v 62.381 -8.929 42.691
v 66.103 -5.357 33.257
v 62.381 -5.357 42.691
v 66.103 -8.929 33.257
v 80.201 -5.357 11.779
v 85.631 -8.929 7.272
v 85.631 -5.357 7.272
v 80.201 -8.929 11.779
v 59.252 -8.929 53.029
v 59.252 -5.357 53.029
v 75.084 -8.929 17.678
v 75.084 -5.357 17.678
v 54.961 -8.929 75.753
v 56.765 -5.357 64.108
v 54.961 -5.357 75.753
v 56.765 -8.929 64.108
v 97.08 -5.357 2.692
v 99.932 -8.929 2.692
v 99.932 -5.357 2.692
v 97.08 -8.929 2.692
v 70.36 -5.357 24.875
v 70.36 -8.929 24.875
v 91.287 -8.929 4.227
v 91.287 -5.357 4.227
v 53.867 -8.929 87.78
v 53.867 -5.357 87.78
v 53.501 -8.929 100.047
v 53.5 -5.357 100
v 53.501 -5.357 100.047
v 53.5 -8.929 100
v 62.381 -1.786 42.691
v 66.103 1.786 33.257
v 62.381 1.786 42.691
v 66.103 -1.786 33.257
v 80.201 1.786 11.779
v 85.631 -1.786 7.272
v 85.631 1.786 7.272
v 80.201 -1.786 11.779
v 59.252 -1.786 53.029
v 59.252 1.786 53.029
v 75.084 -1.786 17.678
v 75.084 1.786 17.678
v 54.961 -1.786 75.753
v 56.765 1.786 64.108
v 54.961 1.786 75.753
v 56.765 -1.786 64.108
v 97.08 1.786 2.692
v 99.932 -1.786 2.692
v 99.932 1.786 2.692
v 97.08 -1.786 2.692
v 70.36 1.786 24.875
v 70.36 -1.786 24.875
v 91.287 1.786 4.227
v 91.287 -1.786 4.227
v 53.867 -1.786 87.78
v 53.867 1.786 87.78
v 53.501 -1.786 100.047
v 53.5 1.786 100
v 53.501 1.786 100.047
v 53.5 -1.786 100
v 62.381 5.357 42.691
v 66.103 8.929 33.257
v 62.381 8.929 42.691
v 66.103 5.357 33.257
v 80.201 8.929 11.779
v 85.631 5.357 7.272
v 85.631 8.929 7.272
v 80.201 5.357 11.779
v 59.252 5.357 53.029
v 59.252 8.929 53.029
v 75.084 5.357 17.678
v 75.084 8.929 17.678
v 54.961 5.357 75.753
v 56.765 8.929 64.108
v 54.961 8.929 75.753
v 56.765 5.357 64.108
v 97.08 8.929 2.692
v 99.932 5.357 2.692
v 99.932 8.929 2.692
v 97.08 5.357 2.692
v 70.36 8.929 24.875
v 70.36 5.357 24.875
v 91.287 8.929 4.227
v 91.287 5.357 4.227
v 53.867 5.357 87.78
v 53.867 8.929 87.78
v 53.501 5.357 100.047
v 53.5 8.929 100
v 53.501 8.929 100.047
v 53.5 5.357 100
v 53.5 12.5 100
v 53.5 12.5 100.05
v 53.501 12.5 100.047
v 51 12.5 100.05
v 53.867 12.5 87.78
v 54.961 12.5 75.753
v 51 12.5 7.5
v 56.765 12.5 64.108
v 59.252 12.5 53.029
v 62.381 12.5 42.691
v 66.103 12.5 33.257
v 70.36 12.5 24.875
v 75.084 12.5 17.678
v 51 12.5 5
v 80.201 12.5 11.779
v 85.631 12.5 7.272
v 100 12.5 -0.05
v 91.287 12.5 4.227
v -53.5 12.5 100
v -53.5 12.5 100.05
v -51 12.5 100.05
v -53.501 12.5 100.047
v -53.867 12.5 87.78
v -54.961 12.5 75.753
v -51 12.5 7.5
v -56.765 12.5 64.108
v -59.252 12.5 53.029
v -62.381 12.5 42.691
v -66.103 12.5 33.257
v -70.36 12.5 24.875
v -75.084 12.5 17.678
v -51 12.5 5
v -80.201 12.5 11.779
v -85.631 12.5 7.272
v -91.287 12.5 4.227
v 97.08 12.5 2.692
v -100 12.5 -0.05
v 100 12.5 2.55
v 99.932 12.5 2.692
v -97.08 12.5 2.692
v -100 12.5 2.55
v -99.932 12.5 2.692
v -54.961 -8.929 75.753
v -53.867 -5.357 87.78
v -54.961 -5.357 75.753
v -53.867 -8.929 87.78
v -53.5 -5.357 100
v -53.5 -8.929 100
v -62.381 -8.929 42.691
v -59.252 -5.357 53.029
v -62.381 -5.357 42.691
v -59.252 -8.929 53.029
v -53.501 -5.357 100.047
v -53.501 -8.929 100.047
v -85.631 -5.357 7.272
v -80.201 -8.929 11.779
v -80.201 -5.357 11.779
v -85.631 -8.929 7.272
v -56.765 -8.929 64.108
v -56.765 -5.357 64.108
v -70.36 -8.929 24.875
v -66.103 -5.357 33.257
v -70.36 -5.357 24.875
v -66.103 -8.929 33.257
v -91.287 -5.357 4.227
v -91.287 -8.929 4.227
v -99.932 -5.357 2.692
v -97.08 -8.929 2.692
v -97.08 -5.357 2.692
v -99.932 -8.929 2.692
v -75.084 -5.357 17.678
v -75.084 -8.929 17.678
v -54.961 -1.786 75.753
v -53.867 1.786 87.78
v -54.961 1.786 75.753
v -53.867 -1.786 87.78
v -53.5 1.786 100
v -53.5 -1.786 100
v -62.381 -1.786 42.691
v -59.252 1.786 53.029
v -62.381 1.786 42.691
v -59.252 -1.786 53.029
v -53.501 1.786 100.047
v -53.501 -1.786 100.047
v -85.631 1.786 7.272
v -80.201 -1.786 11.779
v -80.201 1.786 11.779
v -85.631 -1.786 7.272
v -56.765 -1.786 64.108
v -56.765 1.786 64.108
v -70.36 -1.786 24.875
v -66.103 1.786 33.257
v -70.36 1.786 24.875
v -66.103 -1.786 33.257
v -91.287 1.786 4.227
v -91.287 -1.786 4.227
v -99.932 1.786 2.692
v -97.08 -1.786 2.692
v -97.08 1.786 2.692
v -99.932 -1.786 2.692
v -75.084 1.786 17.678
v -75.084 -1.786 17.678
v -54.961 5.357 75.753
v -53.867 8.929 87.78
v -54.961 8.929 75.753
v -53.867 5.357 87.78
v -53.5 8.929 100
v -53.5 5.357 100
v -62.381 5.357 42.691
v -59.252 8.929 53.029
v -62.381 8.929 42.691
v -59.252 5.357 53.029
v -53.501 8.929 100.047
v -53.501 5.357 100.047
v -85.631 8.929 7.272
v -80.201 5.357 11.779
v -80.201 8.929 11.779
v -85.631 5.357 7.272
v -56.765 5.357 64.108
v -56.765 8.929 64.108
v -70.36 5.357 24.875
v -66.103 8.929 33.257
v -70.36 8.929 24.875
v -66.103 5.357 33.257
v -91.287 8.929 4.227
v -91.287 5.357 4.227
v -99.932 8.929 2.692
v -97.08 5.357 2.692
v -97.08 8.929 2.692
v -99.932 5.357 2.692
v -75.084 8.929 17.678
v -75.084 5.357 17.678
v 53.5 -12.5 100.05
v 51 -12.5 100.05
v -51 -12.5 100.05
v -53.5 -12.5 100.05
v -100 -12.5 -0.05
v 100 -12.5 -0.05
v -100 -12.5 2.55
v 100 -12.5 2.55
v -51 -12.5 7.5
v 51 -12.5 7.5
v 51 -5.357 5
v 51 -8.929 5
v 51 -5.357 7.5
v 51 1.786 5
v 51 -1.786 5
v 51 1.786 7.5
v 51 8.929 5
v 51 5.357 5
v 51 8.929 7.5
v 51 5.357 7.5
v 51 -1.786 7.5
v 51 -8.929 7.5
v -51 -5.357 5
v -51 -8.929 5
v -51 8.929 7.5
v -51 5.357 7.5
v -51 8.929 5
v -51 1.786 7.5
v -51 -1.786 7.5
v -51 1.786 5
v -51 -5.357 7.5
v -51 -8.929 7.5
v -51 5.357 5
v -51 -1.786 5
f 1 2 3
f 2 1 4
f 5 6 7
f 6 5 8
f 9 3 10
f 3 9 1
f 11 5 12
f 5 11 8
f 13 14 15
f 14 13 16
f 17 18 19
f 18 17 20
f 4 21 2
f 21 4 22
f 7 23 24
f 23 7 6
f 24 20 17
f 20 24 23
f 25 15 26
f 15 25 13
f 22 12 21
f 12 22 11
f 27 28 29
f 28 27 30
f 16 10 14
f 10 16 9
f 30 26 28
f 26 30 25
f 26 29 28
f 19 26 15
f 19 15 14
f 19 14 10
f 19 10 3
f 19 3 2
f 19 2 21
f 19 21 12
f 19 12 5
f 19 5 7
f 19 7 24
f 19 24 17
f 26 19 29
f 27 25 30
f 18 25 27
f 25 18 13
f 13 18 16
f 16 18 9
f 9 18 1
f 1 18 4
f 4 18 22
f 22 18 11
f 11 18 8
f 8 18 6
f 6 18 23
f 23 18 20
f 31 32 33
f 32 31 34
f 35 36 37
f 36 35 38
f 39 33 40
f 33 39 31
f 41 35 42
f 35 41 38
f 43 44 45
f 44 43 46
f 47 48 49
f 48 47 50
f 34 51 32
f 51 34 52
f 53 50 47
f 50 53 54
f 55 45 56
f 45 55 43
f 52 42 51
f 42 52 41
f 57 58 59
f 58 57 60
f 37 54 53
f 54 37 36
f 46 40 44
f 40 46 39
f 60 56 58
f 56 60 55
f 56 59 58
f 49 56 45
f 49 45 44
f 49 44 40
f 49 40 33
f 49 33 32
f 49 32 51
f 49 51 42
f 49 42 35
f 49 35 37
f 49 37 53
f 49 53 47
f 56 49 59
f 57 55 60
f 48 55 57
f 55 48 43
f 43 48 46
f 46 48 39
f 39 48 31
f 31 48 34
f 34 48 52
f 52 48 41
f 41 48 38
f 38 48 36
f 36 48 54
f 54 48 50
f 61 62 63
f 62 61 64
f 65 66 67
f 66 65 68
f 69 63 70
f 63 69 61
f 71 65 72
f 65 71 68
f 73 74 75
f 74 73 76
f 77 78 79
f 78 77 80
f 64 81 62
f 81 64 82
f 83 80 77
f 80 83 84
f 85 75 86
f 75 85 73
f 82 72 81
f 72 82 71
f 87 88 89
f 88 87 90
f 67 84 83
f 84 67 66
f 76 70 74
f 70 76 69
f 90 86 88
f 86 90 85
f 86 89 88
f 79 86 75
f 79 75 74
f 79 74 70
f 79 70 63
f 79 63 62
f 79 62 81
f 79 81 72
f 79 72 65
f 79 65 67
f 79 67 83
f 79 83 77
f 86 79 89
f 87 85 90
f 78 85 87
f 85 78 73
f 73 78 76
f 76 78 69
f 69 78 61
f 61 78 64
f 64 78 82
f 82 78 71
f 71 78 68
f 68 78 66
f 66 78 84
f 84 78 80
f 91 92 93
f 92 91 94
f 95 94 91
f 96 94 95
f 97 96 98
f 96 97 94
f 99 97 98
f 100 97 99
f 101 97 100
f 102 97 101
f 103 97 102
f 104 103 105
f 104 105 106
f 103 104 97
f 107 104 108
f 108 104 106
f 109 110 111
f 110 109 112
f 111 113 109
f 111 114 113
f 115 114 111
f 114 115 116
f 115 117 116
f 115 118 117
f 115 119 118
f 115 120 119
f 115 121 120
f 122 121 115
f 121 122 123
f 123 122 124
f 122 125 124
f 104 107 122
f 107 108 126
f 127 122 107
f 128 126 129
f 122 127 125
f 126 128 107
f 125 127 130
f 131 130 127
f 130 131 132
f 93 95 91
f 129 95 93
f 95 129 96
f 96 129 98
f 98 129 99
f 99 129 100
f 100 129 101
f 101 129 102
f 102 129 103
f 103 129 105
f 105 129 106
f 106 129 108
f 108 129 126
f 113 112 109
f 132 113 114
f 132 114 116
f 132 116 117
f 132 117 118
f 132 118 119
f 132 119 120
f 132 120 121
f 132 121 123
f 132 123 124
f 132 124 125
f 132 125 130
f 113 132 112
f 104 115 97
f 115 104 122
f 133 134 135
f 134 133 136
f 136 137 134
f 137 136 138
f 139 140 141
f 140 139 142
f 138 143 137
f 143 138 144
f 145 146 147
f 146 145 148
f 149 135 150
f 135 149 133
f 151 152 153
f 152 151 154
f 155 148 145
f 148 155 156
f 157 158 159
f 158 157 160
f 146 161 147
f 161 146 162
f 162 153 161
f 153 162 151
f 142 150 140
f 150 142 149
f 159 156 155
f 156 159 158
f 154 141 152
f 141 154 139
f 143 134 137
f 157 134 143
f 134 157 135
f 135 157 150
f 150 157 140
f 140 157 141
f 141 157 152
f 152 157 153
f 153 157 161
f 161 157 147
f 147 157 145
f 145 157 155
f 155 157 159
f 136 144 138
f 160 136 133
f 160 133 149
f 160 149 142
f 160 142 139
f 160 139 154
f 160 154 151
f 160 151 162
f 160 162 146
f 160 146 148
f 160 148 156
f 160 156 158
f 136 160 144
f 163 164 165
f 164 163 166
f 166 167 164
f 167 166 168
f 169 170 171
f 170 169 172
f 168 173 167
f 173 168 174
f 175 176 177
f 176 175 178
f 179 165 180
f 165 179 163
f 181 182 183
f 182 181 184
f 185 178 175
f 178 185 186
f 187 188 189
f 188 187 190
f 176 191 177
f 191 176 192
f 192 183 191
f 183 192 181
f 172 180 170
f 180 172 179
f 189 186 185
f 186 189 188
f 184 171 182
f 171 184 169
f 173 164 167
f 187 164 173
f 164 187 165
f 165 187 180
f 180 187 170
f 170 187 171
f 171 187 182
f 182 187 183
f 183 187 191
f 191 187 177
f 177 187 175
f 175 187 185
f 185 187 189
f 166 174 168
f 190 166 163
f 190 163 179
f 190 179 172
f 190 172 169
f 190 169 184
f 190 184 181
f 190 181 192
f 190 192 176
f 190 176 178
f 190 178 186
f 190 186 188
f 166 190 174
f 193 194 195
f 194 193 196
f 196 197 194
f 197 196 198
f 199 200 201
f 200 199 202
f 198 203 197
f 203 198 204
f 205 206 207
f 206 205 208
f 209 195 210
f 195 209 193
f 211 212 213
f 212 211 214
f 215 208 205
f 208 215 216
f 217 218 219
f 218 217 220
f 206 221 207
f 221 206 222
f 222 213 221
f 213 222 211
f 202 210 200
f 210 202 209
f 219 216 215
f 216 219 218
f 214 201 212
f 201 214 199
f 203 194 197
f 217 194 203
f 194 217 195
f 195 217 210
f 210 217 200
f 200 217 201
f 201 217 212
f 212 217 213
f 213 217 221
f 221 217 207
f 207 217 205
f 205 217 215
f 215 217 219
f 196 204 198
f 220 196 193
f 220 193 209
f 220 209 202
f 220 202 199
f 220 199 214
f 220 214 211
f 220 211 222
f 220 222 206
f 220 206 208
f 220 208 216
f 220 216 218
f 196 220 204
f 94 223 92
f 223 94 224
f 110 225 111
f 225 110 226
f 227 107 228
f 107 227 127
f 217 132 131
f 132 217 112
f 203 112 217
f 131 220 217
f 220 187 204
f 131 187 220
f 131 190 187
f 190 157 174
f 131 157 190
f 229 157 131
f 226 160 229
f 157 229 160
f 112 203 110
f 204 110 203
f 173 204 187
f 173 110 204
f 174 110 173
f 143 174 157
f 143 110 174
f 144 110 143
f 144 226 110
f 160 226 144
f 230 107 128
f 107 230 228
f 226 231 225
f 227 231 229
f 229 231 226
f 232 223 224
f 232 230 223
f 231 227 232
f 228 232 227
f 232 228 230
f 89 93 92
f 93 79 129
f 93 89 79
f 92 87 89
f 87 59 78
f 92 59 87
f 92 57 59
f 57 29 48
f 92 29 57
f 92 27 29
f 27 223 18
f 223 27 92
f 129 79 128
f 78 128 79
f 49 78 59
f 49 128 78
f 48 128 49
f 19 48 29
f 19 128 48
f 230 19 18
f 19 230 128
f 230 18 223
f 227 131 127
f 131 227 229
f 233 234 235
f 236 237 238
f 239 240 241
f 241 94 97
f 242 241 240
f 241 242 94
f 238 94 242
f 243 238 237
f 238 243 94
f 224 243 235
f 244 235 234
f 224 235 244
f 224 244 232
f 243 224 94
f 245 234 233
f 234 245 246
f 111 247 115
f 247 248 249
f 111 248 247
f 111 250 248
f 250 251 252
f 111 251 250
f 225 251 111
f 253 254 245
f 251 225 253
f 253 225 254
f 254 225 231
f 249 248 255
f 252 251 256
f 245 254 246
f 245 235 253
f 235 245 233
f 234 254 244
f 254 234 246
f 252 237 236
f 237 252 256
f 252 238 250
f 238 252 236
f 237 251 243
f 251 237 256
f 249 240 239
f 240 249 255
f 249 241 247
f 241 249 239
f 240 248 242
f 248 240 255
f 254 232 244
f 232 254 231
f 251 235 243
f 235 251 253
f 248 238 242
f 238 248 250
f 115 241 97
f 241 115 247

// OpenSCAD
// Depth of the stand, in mm. 
StandDepth = 25;

// Total height of the stand
StandHeight = 100;

// Width of the base of the stand
BaseWidth = 200;

// Width of the slot in the stand. Must be smaller than the width of the base.
SlotWidth = 102;

// Height of the connecting bridge between the two vertical supports. 
BaseHeight = 7.5;

// Size of the edges on the top and side.
MinEdgeWidth = 2.5;

// Number of ridges in the support.
NrRidges = 4;

/* [Hidden] */
 ridgeWidth = StandDepth / (2 * NrRidges - 1);
 
module ridgeDuplicator() {
    for (y = [-StandDepth/2 + ridgeWidth : 2*ridgeWidth : StandDepth/2])
            translate([0,y, 0])
                children(0);
}

module slot() {
    translate([-SlotWidth/2, 0 , BaseHeight]) 
        union() {
             translate([ 0, -StandDepth/2 - .5 , 0]) cube([SlotWidth, StandDepth + 1, StandHeight - BaseHeight + .5]); 
              ridgeDuplicator() 
                 translate([0,0,-MinEdgeWidth])
                    cube([SlotWidth, ridgeWidth, MinEdgeWidth + 1]);
        }
}

module base() {
    supportWidth = (BaseWidth - SlotWidth)/2 - MinEdgeWidth;
    supportHeight = StandHeight - MinEdgeWidth;
    supportXOffset = SlotWidth / 2 +supportWidth + MinEdgeWidth;
    supportZOffset = supportHeight + MinEdgeWidth;
    
    module cutOut() {
        ridgeDuplicator()
             scale([supportWidth, ridgeWidth, supportHeight])rotate(a=90, v=[-1,0,0] ) cylinder( $fn=50);
    }
    
    difference() {
        hull() {
            cube([BaseWidth, StandDepth, .1], center=true);
            translate([0,0, MinEdgeWidth]) cube([BaseWidth, StandDepth, .1], center=true);
            translate([0,0,StandHeight]) cube([SlotWidth + 2*MinEdgeWidth, StandDepth, .1], center=true);
        }
        translate([supportXOffset, 0, supportZOffset]) cutOut();
        translate([-supportXOffset, 0, supportZOffset]) cutOut();
    }
}

difference() {
    base();
    slot();   
}
